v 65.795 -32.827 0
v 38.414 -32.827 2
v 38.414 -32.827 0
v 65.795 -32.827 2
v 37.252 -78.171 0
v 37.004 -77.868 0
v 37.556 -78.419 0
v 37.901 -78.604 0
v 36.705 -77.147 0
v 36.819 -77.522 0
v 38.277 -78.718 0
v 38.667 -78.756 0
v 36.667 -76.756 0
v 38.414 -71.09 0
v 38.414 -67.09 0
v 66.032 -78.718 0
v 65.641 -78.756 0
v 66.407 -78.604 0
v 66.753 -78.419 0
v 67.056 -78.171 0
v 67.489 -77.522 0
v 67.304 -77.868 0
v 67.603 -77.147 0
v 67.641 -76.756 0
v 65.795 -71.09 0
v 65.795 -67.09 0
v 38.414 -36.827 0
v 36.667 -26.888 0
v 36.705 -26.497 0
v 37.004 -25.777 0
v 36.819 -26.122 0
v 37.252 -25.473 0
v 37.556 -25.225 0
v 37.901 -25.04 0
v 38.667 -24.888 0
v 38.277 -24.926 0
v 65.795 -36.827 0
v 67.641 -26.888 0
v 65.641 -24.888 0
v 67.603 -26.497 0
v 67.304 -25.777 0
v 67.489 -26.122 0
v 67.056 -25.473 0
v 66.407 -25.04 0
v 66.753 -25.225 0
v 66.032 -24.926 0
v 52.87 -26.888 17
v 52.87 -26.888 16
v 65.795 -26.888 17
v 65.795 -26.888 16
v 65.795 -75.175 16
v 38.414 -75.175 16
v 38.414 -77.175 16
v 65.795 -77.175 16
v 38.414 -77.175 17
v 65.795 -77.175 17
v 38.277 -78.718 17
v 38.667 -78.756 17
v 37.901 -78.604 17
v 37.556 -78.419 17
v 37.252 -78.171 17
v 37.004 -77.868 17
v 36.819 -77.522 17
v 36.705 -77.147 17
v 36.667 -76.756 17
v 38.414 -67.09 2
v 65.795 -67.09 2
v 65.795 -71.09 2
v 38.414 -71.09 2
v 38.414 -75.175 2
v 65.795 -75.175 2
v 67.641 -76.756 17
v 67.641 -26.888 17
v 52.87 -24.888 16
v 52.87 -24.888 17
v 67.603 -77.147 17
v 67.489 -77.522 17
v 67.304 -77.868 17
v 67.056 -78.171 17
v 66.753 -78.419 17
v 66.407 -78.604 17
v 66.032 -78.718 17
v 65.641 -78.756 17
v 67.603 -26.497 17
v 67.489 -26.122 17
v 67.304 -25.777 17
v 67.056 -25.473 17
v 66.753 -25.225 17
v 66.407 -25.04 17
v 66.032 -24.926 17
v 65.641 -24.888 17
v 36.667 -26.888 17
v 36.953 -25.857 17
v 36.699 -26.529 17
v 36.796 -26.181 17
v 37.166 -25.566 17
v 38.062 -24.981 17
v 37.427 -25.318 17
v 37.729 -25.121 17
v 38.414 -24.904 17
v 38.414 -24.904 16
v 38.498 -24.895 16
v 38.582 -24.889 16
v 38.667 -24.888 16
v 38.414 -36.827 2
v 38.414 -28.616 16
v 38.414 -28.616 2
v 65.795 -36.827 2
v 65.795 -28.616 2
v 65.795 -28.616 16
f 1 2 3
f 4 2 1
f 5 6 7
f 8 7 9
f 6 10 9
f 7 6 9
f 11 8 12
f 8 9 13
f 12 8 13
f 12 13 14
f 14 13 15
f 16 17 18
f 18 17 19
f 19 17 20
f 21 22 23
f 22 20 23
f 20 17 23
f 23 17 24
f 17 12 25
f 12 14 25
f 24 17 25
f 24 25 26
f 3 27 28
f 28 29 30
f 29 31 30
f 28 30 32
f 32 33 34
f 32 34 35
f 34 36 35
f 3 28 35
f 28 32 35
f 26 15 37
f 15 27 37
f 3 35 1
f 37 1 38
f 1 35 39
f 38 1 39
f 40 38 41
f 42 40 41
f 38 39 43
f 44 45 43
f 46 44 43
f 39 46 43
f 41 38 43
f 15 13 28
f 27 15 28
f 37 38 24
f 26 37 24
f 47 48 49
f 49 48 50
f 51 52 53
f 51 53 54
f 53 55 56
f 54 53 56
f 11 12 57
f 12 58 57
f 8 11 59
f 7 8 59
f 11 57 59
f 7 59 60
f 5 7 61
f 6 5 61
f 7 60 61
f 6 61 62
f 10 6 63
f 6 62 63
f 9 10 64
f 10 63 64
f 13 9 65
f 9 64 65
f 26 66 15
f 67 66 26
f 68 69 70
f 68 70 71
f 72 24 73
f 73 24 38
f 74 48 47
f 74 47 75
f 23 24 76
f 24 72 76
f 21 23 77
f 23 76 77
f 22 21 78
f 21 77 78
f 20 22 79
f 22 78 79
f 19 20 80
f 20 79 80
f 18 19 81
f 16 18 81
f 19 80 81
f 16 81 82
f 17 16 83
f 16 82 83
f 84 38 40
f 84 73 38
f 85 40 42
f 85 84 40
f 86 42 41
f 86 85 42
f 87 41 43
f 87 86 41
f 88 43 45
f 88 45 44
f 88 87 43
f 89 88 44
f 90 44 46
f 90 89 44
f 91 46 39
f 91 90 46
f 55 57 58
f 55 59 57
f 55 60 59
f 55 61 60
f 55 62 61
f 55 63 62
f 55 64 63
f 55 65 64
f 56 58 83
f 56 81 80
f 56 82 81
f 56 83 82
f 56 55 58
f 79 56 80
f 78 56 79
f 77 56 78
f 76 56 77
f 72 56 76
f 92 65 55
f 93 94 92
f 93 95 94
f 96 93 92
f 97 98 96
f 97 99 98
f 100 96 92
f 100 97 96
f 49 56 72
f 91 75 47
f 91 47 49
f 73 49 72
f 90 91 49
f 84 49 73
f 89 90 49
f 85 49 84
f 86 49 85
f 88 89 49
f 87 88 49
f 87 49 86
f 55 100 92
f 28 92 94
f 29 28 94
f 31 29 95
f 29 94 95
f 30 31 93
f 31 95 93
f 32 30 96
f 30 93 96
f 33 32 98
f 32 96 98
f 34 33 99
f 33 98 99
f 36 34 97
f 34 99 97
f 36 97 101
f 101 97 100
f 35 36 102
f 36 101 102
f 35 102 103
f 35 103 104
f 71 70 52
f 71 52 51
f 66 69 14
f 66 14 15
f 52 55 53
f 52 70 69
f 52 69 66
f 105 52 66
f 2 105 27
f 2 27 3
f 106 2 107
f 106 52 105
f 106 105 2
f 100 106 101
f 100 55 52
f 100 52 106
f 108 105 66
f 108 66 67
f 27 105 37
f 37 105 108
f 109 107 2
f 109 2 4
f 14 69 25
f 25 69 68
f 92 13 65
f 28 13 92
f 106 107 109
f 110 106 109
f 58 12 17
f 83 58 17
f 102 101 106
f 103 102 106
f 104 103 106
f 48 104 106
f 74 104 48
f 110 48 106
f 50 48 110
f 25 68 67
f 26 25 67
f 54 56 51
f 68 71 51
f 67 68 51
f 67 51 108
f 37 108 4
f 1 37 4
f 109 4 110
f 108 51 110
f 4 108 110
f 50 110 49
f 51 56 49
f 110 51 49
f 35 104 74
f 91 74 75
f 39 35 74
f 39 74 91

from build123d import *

# Parameters (mm, degrees)
SKETCH_3_W          = 30.974653289306993
SKETCH_3_H          = 53.86877740136471
EXTRUDE_1_DEPTH     = 17
SKETCH_5_W          = 27.381586342504548
SKETCH_5_H          = 50.55917117672057
CUT_EXTRUDE_1_DEPTH = 15
SKETCH_6_W          = 27.381586342504548
SKETCH_6_H          = 2
EXTRUDE_2_DEPTH     = 14
SKETCH_9_W          = 27.3909573875588
SKETCH_9_H          = 1.7284906083583529
CUT_EXTRUDE_3_DEPTH = 1
SKETCH_10_W         = 12.935202359823364
SKETCH_10_H         = 2.000000000000007
EXTRUDE_4_DEPTH     = 1
FILLET_1_R          = 2
SKETCH_11_W         = 27.381586342504548
SKETCH_11_H         = 4
CUT_EXTRUDE_4_DEPTH = 10


with BuildPart() as part:
    # 草图3 → 凸台-拉伸1 (new body)
    with BuildSketch(Plane.XY):
        with Locations((52.15403343225914, -51.822040042061936)):
            Rectangle(SKETCH_3_W, SKETCH_3_H)
    extrude(amount=EXTRUDE_1_DEPTH)

    # 草图5 → 切除-拉伸1 (cut)
    with BuildSketch(Plane.XY.offset(17)):
        with Locations((52.10467994598998, -51.89572753809822)):
            Rectangle(SKETCH_5_W, SKETCH_5_H)
    extrude(amount=-CUT_EXTRUDE_1_DEPTH, mode=Mode.SUBTRACT)

    # 草图6 → 凸台-拉伸2 (add)
    with BuildSketch(Plane.XY.offset(2.0000000000000018)):
        with Locations((52.10467994598998, -27.616141949737933)):
            Rectangle(SKETCH_6_W, SKETCH_6_H)
        with Locations((52.10467994598998, -76.1753131264585)):
            Rectangle(SKETCH_6_W, SKETCH_6_H)
    extrude(amount=EXTRUDE_2_DEPTH)

    # 草图9 → 切除-拉伸3 (cut)
    with BuildSketch(Plane.XY.offset(17)):
        with Locations((52.109365468517105, -25.75189664555876)):
            Rectangle(SKETCH_9_W, SKETCH_9_H)
    extrude(amount=-CUT_EXTRUDE_3_DEPTH, mode=Mode.SUBTRACT)

    # 草图10 → 凸台-拉伸4 (add)
    with BuildSketch(Plane.XY.offset(16)):
        with Locations((59.33724298238482, -25.887651341379584)):
            Rectangle(SKETCH_10_W, SKETCH_10_H)
    extrude(amount=EXTRUDE_4_DEPTH)

    # 圆角1
    fillet_1_edges = [part.edges().sort_by_distance(p)[0] for p in [
        (67.64136007691263, -78.75642874274429, 8.5),
        (36.66670678760564, -78.75642874274429, 8.5),
        (36.66670678760564, -24.88765134137958, 8.5),
        (67.64136007691263, -24.88765134137958, 8.5),
    ]]
    fillet(fillet_1_edges, radius=FILLET_1_R)

    # 草图11 → 切除-拉伸4 (cut)
    with BuildSketch(Plane.XY.offset(2.0000000000000018)):
        with Locations((52.10467994598998, -34.82711454905556)):
            Rectangle(SKETCH_11_W, SKETCH_11_H)
        with Locations((52.10467994598998, -69.09032852544172)):
            Rectangle(SKETCH_11_W, SKETCH_11_H)
    extrude(amount=-CUT_EXTRUDE_4_DEPTH, mode=Mode.SUBTRACT)


solid = part.part
